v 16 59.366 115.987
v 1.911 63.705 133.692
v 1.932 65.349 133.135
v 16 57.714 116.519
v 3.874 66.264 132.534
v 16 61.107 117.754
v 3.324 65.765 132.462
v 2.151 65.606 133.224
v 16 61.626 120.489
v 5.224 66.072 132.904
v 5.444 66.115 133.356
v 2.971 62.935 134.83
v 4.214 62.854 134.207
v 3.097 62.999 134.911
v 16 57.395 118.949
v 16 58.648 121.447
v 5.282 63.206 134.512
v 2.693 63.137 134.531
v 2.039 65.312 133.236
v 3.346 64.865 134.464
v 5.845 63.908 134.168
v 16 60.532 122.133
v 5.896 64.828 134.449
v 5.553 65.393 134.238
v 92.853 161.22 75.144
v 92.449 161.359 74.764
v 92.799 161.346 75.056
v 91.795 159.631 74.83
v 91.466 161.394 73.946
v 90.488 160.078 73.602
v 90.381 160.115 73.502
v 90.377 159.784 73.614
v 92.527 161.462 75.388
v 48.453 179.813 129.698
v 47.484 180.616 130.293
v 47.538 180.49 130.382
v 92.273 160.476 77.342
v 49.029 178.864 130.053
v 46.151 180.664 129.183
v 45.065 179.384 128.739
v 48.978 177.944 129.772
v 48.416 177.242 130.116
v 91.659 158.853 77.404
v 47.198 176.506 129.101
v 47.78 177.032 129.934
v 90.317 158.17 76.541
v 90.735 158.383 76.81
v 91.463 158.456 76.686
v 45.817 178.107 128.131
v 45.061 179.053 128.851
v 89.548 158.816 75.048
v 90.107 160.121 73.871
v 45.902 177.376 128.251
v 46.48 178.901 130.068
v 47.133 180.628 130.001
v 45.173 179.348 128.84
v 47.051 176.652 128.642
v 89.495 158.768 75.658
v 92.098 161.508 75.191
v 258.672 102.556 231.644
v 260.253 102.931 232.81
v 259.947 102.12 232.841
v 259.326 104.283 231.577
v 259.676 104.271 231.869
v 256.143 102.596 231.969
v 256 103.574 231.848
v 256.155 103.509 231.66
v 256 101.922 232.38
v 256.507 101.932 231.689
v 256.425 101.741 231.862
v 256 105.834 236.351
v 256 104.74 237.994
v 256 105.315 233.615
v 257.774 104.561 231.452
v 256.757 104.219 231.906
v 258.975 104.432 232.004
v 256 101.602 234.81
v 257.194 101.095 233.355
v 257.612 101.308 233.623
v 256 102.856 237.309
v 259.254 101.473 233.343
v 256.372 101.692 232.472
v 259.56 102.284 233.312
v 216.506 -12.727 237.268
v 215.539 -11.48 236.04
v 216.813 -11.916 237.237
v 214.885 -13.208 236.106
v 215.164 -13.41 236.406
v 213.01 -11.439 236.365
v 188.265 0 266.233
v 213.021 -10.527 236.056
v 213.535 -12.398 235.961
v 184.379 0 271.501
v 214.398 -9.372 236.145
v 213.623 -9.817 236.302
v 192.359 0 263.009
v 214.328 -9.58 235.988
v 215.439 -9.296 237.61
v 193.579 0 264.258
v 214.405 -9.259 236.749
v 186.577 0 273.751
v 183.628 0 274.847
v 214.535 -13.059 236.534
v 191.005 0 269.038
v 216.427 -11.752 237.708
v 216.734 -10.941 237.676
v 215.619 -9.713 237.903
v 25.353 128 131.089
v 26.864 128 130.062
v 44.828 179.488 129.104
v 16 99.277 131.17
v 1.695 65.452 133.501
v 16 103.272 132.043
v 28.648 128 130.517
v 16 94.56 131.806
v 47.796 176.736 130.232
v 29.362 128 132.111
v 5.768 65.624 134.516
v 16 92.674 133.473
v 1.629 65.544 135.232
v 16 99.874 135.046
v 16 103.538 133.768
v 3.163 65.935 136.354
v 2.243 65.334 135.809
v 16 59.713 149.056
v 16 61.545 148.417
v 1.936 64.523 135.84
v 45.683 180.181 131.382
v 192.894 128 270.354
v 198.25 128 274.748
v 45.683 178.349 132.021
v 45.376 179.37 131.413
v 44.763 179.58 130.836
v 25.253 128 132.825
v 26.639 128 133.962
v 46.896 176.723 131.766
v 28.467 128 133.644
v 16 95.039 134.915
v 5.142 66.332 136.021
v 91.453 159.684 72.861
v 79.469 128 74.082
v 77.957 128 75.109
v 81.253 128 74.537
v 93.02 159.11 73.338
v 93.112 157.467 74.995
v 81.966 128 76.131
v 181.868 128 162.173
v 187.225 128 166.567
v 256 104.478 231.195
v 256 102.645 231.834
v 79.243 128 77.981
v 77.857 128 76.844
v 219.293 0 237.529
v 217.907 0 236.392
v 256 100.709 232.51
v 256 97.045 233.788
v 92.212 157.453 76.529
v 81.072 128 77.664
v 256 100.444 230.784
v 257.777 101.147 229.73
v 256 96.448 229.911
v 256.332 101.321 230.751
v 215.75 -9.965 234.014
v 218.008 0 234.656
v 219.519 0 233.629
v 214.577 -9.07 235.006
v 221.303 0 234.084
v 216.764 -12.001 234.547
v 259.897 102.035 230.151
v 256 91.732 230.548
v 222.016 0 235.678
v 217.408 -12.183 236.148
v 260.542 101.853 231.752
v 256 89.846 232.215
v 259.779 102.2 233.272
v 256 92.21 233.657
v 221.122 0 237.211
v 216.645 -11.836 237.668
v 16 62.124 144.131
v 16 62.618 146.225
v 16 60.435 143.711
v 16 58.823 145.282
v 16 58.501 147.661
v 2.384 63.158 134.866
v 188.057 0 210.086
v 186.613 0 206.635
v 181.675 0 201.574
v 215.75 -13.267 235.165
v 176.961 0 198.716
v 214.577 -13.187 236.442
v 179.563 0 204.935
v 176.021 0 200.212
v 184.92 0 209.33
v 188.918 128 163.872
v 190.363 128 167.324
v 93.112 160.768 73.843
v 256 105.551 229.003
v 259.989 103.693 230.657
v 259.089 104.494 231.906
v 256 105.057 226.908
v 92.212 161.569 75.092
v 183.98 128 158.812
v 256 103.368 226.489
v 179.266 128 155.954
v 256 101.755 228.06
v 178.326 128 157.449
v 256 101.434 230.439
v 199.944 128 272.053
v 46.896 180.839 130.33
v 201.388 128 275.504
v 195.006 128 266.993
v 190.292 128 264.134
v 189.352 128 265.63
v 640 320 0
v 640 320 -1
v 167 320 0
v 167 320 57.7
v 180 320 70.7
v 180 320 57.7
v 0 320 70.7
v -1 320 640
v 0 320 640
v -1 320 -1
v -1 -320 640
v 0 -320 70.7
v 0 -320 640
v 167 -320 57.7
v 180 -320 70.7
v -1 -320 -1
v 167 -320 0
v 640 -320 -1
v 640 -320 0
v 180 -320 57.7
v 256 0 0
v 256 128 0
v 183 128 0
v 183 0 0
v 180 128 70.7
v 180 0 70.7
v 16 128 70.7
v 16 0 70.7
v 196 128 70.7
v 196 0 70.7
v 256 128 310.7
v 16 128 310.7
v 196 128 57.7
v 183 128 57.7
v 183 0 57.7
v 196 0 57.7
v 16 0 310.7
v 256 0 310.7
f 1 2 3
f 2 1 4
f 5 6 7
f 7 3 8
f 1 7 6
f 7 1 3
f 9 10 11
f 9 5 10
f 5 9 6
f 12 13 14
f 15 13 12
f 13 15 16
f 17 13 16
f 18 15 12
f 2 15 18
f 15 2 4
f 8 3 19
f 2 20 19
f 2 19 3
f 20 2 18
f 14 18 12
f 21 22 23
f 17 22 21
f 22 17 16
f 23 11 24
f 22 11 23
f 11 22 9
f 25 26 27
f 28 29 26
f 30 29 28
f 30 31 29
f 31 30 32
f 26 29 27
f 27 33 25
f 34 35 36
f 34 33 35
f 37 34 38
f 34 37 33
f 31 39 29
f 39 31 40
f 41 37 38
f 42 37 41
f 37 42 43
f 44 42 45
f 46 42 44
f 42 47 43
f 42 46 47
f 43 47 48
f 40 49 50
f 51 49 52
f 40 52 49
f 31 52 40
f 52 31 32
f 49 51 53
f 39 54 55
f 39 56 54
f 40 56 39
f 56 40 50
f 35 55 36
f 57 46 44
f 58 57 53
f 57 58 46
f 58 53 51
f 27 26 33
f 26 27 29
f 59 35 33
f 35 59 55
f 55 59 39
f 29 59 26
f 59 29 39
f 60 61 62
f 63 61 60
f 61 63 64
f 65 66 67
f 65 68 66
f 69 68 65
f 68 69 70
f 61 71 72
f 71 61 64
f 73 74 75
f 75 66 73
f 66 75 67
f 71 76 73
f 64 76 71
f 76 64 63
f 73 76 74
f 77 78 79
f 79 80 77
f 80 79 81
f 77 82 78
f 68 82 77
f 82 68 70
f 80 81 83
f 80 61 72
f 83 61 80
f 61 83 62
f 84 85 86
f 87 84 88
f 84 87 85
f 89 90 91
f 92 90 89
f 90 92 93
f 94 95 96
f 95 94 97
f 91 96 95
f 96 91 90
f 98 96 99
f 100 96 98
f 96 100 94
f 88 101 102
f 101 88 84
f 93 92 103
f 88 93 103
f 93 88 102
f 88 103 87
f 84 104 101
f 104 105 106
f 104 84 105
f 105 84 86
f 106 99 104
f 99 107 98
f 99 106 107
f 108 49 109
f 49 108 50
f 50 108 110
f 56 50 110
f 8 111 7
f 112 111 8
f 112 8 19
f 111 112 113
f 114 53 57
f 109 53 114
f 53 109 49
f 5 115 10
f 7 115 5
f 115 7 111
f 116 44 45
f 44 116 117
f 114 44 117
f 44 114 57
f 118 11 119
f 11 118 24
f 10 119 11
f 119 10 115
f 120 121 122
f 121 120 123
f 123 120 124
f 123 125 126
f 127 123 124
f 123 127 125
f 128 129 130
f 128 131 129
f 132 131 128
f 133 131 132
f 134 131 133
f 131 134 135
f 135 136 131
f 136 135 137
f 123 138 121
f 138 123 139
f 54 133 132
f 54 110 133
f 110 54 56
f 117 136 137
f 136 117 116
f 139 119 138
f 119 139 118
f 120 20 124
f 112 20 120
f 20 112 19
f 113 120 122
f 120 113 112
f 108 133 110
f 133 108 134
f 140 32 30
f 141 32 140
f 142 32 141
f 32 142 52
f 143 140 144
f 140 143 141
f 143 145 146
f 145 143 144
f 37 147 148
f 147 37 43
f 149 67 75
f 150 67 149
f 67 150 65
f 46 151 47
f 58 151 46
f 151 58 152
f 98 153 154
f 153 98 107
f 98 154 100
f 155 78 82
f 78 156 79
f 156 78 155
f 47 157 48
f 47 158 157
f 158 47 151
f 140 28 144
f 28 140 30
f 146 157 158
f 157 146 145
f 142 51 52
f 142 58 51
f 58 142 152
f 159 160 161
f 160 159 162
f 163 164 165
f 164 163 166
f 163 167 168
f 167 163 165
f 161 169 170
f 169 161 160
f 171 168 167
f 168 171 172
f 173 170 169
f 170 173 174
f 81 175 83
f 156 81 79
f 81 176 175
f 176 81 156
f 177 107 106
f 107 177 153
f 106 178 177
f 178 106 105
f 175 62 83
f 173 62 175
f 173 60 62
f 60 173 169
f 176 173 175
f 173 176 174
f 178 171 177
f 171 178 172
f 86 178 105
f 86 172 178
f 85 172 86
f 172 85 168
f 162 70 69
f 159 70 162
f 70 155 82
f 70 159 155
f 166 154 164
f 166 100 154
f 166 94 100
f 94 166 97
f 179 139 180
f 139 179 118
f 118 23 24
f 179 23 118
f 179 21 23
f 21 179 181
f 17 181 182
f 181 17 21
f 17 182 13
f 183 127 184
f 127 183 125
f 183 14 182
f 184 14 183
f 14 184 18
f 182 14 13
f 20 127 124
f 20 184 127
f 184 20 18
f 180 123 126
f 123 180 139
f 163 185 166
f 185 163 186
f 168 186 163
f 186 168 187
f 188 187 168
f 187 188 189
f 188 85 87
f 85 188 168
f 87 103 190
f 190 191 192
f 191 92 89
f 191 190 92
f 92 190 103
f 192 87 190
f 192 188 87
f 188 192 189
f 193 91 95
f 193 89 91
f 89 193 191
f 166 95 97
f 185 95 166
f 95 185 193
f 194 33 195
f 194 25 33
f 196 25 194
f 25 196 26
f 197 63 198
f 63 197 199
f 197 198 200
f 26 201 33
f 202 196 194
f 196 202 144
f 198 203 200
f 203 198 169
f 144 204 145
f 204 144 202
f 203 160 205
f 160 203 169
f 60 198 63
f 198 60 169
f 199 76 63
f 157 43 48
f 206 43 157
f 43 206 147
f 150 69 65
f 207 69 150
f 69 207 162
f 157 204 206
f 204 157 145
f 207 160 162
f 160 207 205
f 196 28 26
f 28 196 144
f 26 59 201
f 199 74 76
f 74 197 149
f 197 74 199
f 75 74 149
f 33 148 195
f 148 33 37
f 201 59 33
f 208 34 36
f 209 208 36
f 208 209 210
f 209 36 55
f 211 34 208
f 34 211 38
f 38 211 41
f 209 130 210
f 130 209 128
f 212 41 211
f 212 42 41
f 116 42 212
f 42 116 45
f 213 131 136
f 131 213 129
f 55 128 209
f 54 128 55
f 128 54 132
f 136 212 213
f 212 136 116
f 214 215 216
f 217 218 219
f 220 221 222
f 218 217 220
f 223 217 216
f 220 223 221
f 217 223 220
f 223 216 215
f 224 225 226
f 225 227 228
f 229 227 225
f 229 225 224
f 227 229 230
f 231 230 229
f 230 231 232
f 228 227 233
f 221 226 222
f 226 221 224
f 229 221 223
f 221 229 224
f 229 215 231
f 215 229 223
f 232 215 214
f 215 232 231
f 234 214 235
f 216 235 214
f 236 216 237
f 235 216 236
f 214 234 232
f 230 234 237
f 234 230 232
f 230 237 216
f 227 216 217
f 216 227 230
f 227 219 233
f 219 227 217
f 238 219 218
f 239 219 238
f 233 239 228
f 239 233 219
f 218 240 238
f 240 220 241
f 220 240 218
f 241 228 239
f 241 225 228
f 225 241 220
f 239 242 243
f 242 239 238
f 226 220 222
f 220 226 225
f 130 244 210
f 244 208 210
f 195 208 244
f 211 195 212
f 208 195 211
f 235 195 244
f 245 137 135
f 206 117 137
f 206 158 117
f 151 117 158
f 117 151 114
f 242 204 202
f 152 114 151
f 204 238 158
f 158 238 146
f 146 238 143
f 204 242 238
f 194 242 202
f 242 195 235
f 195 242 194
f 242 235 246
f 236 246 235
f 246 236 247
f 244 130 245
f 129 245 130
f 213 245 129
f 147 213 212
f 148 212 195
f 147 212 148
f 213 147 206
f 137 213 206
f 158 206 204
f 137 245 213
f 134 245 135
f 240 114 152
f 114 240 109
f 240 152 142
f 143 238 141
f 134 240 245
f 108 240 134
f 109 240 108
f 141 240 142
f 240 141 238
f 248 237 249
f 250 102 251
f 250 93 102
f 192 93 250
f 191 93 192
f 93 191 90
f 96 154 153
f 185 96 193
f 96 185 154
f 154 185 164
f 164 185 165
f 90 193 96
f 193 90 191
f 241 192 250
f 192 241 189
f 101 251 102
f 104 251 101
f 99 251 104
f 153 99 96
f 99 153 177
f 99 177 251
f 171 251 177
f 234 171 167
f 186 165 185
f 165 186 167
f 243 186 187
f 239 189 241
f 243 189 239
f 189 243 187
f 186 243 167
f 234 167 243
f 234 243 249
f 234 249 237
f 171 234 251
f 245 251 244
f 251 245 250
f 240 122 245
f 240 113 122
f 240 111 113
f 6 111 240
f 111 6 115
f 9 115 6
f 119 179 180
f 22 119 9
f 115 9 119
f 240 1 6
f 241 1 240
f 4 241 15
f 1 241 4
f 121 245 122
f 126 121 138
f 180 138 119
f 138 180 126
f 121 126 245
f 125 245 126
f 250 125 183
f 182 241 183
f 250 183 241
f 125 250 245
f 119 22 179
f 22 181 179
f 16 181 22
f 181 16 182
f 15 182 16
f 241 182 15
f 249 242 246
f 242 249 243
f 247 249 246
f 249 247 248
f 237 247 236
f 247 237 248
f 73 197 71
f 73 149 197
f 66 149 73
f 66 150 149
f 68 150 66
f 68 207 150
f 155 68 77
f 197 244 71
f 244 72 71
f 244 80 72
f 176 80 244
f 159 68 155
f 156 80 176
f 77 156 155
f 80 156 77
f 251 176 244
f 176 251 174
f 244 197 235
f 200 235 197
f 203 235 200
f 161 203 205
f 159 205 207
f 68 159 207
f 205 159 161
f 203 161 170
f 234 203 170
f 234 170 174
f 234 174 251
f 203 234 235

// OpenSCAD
use <MCAD/boxes.scad>

module mark(name = "andold", height = 4, base = BASE, mx = ROUND * 2) {
	translate([-base[0] / 2 + mx, base[1] / 2 - mx, base[2] / 2 - height])
		rotate([180, 0, 0])
			linear_extrude(THICK, center = false)
				text(name, size = 1, language = "kr", font = "NanumGothic");
}

module lineBox(outter = [100, 100, 100], t = 2) {
	size = outter - [t*2, t*2, t*2];
	center = false;

	scale([1, 1, 1]) translate([t, t, t])	{
		
	// x
	translate([0, 0, 0])						rotate([0, 90, 0])		cylinder(h = size[0], r = t, center = center);
	translate([0, size[1], 0])			rotate([0, 90, 0])		cylinder(h = size[0], r = t, center = center);
	translate([0, size[1], size[2]])	rotate([0, 90, 0])		cylinder(h = size[0], r = t, center = center);
	translate([0, 0, size[2]])			rotate([0, 90, 0])		cylinder(h = size[0], r = t, center = center);

	// y
	translate([0, 0, 0])						rotate([270, 0, 0])		cylinder(h = size[1], r = t, center = center);
	translate([size[0], 0, 0])			rotate([270, 0, 0])		cylinder(h = size[1], r = t, center = center);
	translate([size[0], 0, size[2]])	rotate([270, 0, 0])		cylinder(h = size[1], r = t, center = center);
	translate([0, 0, size[2]])			rotate([270, 0, 0])		cylinder(h = size[1], r = t, center = center);

	// z
	translate([0, 0, 0])						rotate([0, 0, 0])		cylinder(h = size[2], r = t, center = center);
	translate([size[0], 0, 0])			rotate([0, 0, 0])		cylinder(h = size[2], r = t, center = center);
	translate([size[0], size[1], 0])	rotate([0, 0, 0])		cylinder(h = size[2], r = t, center = center);
	translate([0, size[1], 0])	rotate([0, 0, 0])				cylinder(h = size[2], r = t, center = center);
	}
}

module basis() {
	main = [78, 126, 240];	//	높이는 230mm 이상이어야 한다.
	full = [240, 128, 240 + 70.7];

	color([0.8, 0.8, 0.8, 0.5])	wall(640, 640);
	translate([0, 0, 70.7])
		translate([0, 64, 64])		rotate([20, 0, 0])		rotate([0, 45, 0])		rotate([0, 0, -30])
		color([0.8, 0.8, 0.0, 0.8])	
		lineBox(main);

	//color([0.8, 0.0, 0.8, 0.5])	lineBox(full, 1);	//	점유 영역?
	translate([16, 0, 0])	color([0.0, 0.0, 0.8, 0.5])	body(full[0], full[1], full[2]);	//	점유 영역?
}

basis();


module wall(x, y, z) {
	points = [
		[0,	0],
		[0,	y],
		[-1,	y],
		[-1,	-1],
		[x,	-1],
		[x,	0],
		[0,	0],

		[0,	0],
		[0,	70.7],	//	70.7
		[180,	70.7],	//	180
		[180,	57.7],	//	20
		[167,	57.7],	//	13
		[167,	0],		//	57.7
		[0, 0]			//	167
	];
	translate([0, y / 2, 0])	rotate([90, 0, 0])	linear_extrude(x)	polygon(points);
}
module body(x, y, z) {
	points = [
		[0,	70.7],	//	70.7
		[0,	z],		//	dy
		[x,	z],		//	x
		[x,	0],		// y
		[167,	0],		// 167
		[167,	57.7]	,	// 57.7
		[180,	57.7],	// 13
		[180,	70.7],	// 20
		[180,	70.7],	// 20
		[0,	70.7]	//	70.7
	];
	translate([0, y, 0])	rotate([90, 0, 0])	linear_extrude(y)	polygon(points);
}
